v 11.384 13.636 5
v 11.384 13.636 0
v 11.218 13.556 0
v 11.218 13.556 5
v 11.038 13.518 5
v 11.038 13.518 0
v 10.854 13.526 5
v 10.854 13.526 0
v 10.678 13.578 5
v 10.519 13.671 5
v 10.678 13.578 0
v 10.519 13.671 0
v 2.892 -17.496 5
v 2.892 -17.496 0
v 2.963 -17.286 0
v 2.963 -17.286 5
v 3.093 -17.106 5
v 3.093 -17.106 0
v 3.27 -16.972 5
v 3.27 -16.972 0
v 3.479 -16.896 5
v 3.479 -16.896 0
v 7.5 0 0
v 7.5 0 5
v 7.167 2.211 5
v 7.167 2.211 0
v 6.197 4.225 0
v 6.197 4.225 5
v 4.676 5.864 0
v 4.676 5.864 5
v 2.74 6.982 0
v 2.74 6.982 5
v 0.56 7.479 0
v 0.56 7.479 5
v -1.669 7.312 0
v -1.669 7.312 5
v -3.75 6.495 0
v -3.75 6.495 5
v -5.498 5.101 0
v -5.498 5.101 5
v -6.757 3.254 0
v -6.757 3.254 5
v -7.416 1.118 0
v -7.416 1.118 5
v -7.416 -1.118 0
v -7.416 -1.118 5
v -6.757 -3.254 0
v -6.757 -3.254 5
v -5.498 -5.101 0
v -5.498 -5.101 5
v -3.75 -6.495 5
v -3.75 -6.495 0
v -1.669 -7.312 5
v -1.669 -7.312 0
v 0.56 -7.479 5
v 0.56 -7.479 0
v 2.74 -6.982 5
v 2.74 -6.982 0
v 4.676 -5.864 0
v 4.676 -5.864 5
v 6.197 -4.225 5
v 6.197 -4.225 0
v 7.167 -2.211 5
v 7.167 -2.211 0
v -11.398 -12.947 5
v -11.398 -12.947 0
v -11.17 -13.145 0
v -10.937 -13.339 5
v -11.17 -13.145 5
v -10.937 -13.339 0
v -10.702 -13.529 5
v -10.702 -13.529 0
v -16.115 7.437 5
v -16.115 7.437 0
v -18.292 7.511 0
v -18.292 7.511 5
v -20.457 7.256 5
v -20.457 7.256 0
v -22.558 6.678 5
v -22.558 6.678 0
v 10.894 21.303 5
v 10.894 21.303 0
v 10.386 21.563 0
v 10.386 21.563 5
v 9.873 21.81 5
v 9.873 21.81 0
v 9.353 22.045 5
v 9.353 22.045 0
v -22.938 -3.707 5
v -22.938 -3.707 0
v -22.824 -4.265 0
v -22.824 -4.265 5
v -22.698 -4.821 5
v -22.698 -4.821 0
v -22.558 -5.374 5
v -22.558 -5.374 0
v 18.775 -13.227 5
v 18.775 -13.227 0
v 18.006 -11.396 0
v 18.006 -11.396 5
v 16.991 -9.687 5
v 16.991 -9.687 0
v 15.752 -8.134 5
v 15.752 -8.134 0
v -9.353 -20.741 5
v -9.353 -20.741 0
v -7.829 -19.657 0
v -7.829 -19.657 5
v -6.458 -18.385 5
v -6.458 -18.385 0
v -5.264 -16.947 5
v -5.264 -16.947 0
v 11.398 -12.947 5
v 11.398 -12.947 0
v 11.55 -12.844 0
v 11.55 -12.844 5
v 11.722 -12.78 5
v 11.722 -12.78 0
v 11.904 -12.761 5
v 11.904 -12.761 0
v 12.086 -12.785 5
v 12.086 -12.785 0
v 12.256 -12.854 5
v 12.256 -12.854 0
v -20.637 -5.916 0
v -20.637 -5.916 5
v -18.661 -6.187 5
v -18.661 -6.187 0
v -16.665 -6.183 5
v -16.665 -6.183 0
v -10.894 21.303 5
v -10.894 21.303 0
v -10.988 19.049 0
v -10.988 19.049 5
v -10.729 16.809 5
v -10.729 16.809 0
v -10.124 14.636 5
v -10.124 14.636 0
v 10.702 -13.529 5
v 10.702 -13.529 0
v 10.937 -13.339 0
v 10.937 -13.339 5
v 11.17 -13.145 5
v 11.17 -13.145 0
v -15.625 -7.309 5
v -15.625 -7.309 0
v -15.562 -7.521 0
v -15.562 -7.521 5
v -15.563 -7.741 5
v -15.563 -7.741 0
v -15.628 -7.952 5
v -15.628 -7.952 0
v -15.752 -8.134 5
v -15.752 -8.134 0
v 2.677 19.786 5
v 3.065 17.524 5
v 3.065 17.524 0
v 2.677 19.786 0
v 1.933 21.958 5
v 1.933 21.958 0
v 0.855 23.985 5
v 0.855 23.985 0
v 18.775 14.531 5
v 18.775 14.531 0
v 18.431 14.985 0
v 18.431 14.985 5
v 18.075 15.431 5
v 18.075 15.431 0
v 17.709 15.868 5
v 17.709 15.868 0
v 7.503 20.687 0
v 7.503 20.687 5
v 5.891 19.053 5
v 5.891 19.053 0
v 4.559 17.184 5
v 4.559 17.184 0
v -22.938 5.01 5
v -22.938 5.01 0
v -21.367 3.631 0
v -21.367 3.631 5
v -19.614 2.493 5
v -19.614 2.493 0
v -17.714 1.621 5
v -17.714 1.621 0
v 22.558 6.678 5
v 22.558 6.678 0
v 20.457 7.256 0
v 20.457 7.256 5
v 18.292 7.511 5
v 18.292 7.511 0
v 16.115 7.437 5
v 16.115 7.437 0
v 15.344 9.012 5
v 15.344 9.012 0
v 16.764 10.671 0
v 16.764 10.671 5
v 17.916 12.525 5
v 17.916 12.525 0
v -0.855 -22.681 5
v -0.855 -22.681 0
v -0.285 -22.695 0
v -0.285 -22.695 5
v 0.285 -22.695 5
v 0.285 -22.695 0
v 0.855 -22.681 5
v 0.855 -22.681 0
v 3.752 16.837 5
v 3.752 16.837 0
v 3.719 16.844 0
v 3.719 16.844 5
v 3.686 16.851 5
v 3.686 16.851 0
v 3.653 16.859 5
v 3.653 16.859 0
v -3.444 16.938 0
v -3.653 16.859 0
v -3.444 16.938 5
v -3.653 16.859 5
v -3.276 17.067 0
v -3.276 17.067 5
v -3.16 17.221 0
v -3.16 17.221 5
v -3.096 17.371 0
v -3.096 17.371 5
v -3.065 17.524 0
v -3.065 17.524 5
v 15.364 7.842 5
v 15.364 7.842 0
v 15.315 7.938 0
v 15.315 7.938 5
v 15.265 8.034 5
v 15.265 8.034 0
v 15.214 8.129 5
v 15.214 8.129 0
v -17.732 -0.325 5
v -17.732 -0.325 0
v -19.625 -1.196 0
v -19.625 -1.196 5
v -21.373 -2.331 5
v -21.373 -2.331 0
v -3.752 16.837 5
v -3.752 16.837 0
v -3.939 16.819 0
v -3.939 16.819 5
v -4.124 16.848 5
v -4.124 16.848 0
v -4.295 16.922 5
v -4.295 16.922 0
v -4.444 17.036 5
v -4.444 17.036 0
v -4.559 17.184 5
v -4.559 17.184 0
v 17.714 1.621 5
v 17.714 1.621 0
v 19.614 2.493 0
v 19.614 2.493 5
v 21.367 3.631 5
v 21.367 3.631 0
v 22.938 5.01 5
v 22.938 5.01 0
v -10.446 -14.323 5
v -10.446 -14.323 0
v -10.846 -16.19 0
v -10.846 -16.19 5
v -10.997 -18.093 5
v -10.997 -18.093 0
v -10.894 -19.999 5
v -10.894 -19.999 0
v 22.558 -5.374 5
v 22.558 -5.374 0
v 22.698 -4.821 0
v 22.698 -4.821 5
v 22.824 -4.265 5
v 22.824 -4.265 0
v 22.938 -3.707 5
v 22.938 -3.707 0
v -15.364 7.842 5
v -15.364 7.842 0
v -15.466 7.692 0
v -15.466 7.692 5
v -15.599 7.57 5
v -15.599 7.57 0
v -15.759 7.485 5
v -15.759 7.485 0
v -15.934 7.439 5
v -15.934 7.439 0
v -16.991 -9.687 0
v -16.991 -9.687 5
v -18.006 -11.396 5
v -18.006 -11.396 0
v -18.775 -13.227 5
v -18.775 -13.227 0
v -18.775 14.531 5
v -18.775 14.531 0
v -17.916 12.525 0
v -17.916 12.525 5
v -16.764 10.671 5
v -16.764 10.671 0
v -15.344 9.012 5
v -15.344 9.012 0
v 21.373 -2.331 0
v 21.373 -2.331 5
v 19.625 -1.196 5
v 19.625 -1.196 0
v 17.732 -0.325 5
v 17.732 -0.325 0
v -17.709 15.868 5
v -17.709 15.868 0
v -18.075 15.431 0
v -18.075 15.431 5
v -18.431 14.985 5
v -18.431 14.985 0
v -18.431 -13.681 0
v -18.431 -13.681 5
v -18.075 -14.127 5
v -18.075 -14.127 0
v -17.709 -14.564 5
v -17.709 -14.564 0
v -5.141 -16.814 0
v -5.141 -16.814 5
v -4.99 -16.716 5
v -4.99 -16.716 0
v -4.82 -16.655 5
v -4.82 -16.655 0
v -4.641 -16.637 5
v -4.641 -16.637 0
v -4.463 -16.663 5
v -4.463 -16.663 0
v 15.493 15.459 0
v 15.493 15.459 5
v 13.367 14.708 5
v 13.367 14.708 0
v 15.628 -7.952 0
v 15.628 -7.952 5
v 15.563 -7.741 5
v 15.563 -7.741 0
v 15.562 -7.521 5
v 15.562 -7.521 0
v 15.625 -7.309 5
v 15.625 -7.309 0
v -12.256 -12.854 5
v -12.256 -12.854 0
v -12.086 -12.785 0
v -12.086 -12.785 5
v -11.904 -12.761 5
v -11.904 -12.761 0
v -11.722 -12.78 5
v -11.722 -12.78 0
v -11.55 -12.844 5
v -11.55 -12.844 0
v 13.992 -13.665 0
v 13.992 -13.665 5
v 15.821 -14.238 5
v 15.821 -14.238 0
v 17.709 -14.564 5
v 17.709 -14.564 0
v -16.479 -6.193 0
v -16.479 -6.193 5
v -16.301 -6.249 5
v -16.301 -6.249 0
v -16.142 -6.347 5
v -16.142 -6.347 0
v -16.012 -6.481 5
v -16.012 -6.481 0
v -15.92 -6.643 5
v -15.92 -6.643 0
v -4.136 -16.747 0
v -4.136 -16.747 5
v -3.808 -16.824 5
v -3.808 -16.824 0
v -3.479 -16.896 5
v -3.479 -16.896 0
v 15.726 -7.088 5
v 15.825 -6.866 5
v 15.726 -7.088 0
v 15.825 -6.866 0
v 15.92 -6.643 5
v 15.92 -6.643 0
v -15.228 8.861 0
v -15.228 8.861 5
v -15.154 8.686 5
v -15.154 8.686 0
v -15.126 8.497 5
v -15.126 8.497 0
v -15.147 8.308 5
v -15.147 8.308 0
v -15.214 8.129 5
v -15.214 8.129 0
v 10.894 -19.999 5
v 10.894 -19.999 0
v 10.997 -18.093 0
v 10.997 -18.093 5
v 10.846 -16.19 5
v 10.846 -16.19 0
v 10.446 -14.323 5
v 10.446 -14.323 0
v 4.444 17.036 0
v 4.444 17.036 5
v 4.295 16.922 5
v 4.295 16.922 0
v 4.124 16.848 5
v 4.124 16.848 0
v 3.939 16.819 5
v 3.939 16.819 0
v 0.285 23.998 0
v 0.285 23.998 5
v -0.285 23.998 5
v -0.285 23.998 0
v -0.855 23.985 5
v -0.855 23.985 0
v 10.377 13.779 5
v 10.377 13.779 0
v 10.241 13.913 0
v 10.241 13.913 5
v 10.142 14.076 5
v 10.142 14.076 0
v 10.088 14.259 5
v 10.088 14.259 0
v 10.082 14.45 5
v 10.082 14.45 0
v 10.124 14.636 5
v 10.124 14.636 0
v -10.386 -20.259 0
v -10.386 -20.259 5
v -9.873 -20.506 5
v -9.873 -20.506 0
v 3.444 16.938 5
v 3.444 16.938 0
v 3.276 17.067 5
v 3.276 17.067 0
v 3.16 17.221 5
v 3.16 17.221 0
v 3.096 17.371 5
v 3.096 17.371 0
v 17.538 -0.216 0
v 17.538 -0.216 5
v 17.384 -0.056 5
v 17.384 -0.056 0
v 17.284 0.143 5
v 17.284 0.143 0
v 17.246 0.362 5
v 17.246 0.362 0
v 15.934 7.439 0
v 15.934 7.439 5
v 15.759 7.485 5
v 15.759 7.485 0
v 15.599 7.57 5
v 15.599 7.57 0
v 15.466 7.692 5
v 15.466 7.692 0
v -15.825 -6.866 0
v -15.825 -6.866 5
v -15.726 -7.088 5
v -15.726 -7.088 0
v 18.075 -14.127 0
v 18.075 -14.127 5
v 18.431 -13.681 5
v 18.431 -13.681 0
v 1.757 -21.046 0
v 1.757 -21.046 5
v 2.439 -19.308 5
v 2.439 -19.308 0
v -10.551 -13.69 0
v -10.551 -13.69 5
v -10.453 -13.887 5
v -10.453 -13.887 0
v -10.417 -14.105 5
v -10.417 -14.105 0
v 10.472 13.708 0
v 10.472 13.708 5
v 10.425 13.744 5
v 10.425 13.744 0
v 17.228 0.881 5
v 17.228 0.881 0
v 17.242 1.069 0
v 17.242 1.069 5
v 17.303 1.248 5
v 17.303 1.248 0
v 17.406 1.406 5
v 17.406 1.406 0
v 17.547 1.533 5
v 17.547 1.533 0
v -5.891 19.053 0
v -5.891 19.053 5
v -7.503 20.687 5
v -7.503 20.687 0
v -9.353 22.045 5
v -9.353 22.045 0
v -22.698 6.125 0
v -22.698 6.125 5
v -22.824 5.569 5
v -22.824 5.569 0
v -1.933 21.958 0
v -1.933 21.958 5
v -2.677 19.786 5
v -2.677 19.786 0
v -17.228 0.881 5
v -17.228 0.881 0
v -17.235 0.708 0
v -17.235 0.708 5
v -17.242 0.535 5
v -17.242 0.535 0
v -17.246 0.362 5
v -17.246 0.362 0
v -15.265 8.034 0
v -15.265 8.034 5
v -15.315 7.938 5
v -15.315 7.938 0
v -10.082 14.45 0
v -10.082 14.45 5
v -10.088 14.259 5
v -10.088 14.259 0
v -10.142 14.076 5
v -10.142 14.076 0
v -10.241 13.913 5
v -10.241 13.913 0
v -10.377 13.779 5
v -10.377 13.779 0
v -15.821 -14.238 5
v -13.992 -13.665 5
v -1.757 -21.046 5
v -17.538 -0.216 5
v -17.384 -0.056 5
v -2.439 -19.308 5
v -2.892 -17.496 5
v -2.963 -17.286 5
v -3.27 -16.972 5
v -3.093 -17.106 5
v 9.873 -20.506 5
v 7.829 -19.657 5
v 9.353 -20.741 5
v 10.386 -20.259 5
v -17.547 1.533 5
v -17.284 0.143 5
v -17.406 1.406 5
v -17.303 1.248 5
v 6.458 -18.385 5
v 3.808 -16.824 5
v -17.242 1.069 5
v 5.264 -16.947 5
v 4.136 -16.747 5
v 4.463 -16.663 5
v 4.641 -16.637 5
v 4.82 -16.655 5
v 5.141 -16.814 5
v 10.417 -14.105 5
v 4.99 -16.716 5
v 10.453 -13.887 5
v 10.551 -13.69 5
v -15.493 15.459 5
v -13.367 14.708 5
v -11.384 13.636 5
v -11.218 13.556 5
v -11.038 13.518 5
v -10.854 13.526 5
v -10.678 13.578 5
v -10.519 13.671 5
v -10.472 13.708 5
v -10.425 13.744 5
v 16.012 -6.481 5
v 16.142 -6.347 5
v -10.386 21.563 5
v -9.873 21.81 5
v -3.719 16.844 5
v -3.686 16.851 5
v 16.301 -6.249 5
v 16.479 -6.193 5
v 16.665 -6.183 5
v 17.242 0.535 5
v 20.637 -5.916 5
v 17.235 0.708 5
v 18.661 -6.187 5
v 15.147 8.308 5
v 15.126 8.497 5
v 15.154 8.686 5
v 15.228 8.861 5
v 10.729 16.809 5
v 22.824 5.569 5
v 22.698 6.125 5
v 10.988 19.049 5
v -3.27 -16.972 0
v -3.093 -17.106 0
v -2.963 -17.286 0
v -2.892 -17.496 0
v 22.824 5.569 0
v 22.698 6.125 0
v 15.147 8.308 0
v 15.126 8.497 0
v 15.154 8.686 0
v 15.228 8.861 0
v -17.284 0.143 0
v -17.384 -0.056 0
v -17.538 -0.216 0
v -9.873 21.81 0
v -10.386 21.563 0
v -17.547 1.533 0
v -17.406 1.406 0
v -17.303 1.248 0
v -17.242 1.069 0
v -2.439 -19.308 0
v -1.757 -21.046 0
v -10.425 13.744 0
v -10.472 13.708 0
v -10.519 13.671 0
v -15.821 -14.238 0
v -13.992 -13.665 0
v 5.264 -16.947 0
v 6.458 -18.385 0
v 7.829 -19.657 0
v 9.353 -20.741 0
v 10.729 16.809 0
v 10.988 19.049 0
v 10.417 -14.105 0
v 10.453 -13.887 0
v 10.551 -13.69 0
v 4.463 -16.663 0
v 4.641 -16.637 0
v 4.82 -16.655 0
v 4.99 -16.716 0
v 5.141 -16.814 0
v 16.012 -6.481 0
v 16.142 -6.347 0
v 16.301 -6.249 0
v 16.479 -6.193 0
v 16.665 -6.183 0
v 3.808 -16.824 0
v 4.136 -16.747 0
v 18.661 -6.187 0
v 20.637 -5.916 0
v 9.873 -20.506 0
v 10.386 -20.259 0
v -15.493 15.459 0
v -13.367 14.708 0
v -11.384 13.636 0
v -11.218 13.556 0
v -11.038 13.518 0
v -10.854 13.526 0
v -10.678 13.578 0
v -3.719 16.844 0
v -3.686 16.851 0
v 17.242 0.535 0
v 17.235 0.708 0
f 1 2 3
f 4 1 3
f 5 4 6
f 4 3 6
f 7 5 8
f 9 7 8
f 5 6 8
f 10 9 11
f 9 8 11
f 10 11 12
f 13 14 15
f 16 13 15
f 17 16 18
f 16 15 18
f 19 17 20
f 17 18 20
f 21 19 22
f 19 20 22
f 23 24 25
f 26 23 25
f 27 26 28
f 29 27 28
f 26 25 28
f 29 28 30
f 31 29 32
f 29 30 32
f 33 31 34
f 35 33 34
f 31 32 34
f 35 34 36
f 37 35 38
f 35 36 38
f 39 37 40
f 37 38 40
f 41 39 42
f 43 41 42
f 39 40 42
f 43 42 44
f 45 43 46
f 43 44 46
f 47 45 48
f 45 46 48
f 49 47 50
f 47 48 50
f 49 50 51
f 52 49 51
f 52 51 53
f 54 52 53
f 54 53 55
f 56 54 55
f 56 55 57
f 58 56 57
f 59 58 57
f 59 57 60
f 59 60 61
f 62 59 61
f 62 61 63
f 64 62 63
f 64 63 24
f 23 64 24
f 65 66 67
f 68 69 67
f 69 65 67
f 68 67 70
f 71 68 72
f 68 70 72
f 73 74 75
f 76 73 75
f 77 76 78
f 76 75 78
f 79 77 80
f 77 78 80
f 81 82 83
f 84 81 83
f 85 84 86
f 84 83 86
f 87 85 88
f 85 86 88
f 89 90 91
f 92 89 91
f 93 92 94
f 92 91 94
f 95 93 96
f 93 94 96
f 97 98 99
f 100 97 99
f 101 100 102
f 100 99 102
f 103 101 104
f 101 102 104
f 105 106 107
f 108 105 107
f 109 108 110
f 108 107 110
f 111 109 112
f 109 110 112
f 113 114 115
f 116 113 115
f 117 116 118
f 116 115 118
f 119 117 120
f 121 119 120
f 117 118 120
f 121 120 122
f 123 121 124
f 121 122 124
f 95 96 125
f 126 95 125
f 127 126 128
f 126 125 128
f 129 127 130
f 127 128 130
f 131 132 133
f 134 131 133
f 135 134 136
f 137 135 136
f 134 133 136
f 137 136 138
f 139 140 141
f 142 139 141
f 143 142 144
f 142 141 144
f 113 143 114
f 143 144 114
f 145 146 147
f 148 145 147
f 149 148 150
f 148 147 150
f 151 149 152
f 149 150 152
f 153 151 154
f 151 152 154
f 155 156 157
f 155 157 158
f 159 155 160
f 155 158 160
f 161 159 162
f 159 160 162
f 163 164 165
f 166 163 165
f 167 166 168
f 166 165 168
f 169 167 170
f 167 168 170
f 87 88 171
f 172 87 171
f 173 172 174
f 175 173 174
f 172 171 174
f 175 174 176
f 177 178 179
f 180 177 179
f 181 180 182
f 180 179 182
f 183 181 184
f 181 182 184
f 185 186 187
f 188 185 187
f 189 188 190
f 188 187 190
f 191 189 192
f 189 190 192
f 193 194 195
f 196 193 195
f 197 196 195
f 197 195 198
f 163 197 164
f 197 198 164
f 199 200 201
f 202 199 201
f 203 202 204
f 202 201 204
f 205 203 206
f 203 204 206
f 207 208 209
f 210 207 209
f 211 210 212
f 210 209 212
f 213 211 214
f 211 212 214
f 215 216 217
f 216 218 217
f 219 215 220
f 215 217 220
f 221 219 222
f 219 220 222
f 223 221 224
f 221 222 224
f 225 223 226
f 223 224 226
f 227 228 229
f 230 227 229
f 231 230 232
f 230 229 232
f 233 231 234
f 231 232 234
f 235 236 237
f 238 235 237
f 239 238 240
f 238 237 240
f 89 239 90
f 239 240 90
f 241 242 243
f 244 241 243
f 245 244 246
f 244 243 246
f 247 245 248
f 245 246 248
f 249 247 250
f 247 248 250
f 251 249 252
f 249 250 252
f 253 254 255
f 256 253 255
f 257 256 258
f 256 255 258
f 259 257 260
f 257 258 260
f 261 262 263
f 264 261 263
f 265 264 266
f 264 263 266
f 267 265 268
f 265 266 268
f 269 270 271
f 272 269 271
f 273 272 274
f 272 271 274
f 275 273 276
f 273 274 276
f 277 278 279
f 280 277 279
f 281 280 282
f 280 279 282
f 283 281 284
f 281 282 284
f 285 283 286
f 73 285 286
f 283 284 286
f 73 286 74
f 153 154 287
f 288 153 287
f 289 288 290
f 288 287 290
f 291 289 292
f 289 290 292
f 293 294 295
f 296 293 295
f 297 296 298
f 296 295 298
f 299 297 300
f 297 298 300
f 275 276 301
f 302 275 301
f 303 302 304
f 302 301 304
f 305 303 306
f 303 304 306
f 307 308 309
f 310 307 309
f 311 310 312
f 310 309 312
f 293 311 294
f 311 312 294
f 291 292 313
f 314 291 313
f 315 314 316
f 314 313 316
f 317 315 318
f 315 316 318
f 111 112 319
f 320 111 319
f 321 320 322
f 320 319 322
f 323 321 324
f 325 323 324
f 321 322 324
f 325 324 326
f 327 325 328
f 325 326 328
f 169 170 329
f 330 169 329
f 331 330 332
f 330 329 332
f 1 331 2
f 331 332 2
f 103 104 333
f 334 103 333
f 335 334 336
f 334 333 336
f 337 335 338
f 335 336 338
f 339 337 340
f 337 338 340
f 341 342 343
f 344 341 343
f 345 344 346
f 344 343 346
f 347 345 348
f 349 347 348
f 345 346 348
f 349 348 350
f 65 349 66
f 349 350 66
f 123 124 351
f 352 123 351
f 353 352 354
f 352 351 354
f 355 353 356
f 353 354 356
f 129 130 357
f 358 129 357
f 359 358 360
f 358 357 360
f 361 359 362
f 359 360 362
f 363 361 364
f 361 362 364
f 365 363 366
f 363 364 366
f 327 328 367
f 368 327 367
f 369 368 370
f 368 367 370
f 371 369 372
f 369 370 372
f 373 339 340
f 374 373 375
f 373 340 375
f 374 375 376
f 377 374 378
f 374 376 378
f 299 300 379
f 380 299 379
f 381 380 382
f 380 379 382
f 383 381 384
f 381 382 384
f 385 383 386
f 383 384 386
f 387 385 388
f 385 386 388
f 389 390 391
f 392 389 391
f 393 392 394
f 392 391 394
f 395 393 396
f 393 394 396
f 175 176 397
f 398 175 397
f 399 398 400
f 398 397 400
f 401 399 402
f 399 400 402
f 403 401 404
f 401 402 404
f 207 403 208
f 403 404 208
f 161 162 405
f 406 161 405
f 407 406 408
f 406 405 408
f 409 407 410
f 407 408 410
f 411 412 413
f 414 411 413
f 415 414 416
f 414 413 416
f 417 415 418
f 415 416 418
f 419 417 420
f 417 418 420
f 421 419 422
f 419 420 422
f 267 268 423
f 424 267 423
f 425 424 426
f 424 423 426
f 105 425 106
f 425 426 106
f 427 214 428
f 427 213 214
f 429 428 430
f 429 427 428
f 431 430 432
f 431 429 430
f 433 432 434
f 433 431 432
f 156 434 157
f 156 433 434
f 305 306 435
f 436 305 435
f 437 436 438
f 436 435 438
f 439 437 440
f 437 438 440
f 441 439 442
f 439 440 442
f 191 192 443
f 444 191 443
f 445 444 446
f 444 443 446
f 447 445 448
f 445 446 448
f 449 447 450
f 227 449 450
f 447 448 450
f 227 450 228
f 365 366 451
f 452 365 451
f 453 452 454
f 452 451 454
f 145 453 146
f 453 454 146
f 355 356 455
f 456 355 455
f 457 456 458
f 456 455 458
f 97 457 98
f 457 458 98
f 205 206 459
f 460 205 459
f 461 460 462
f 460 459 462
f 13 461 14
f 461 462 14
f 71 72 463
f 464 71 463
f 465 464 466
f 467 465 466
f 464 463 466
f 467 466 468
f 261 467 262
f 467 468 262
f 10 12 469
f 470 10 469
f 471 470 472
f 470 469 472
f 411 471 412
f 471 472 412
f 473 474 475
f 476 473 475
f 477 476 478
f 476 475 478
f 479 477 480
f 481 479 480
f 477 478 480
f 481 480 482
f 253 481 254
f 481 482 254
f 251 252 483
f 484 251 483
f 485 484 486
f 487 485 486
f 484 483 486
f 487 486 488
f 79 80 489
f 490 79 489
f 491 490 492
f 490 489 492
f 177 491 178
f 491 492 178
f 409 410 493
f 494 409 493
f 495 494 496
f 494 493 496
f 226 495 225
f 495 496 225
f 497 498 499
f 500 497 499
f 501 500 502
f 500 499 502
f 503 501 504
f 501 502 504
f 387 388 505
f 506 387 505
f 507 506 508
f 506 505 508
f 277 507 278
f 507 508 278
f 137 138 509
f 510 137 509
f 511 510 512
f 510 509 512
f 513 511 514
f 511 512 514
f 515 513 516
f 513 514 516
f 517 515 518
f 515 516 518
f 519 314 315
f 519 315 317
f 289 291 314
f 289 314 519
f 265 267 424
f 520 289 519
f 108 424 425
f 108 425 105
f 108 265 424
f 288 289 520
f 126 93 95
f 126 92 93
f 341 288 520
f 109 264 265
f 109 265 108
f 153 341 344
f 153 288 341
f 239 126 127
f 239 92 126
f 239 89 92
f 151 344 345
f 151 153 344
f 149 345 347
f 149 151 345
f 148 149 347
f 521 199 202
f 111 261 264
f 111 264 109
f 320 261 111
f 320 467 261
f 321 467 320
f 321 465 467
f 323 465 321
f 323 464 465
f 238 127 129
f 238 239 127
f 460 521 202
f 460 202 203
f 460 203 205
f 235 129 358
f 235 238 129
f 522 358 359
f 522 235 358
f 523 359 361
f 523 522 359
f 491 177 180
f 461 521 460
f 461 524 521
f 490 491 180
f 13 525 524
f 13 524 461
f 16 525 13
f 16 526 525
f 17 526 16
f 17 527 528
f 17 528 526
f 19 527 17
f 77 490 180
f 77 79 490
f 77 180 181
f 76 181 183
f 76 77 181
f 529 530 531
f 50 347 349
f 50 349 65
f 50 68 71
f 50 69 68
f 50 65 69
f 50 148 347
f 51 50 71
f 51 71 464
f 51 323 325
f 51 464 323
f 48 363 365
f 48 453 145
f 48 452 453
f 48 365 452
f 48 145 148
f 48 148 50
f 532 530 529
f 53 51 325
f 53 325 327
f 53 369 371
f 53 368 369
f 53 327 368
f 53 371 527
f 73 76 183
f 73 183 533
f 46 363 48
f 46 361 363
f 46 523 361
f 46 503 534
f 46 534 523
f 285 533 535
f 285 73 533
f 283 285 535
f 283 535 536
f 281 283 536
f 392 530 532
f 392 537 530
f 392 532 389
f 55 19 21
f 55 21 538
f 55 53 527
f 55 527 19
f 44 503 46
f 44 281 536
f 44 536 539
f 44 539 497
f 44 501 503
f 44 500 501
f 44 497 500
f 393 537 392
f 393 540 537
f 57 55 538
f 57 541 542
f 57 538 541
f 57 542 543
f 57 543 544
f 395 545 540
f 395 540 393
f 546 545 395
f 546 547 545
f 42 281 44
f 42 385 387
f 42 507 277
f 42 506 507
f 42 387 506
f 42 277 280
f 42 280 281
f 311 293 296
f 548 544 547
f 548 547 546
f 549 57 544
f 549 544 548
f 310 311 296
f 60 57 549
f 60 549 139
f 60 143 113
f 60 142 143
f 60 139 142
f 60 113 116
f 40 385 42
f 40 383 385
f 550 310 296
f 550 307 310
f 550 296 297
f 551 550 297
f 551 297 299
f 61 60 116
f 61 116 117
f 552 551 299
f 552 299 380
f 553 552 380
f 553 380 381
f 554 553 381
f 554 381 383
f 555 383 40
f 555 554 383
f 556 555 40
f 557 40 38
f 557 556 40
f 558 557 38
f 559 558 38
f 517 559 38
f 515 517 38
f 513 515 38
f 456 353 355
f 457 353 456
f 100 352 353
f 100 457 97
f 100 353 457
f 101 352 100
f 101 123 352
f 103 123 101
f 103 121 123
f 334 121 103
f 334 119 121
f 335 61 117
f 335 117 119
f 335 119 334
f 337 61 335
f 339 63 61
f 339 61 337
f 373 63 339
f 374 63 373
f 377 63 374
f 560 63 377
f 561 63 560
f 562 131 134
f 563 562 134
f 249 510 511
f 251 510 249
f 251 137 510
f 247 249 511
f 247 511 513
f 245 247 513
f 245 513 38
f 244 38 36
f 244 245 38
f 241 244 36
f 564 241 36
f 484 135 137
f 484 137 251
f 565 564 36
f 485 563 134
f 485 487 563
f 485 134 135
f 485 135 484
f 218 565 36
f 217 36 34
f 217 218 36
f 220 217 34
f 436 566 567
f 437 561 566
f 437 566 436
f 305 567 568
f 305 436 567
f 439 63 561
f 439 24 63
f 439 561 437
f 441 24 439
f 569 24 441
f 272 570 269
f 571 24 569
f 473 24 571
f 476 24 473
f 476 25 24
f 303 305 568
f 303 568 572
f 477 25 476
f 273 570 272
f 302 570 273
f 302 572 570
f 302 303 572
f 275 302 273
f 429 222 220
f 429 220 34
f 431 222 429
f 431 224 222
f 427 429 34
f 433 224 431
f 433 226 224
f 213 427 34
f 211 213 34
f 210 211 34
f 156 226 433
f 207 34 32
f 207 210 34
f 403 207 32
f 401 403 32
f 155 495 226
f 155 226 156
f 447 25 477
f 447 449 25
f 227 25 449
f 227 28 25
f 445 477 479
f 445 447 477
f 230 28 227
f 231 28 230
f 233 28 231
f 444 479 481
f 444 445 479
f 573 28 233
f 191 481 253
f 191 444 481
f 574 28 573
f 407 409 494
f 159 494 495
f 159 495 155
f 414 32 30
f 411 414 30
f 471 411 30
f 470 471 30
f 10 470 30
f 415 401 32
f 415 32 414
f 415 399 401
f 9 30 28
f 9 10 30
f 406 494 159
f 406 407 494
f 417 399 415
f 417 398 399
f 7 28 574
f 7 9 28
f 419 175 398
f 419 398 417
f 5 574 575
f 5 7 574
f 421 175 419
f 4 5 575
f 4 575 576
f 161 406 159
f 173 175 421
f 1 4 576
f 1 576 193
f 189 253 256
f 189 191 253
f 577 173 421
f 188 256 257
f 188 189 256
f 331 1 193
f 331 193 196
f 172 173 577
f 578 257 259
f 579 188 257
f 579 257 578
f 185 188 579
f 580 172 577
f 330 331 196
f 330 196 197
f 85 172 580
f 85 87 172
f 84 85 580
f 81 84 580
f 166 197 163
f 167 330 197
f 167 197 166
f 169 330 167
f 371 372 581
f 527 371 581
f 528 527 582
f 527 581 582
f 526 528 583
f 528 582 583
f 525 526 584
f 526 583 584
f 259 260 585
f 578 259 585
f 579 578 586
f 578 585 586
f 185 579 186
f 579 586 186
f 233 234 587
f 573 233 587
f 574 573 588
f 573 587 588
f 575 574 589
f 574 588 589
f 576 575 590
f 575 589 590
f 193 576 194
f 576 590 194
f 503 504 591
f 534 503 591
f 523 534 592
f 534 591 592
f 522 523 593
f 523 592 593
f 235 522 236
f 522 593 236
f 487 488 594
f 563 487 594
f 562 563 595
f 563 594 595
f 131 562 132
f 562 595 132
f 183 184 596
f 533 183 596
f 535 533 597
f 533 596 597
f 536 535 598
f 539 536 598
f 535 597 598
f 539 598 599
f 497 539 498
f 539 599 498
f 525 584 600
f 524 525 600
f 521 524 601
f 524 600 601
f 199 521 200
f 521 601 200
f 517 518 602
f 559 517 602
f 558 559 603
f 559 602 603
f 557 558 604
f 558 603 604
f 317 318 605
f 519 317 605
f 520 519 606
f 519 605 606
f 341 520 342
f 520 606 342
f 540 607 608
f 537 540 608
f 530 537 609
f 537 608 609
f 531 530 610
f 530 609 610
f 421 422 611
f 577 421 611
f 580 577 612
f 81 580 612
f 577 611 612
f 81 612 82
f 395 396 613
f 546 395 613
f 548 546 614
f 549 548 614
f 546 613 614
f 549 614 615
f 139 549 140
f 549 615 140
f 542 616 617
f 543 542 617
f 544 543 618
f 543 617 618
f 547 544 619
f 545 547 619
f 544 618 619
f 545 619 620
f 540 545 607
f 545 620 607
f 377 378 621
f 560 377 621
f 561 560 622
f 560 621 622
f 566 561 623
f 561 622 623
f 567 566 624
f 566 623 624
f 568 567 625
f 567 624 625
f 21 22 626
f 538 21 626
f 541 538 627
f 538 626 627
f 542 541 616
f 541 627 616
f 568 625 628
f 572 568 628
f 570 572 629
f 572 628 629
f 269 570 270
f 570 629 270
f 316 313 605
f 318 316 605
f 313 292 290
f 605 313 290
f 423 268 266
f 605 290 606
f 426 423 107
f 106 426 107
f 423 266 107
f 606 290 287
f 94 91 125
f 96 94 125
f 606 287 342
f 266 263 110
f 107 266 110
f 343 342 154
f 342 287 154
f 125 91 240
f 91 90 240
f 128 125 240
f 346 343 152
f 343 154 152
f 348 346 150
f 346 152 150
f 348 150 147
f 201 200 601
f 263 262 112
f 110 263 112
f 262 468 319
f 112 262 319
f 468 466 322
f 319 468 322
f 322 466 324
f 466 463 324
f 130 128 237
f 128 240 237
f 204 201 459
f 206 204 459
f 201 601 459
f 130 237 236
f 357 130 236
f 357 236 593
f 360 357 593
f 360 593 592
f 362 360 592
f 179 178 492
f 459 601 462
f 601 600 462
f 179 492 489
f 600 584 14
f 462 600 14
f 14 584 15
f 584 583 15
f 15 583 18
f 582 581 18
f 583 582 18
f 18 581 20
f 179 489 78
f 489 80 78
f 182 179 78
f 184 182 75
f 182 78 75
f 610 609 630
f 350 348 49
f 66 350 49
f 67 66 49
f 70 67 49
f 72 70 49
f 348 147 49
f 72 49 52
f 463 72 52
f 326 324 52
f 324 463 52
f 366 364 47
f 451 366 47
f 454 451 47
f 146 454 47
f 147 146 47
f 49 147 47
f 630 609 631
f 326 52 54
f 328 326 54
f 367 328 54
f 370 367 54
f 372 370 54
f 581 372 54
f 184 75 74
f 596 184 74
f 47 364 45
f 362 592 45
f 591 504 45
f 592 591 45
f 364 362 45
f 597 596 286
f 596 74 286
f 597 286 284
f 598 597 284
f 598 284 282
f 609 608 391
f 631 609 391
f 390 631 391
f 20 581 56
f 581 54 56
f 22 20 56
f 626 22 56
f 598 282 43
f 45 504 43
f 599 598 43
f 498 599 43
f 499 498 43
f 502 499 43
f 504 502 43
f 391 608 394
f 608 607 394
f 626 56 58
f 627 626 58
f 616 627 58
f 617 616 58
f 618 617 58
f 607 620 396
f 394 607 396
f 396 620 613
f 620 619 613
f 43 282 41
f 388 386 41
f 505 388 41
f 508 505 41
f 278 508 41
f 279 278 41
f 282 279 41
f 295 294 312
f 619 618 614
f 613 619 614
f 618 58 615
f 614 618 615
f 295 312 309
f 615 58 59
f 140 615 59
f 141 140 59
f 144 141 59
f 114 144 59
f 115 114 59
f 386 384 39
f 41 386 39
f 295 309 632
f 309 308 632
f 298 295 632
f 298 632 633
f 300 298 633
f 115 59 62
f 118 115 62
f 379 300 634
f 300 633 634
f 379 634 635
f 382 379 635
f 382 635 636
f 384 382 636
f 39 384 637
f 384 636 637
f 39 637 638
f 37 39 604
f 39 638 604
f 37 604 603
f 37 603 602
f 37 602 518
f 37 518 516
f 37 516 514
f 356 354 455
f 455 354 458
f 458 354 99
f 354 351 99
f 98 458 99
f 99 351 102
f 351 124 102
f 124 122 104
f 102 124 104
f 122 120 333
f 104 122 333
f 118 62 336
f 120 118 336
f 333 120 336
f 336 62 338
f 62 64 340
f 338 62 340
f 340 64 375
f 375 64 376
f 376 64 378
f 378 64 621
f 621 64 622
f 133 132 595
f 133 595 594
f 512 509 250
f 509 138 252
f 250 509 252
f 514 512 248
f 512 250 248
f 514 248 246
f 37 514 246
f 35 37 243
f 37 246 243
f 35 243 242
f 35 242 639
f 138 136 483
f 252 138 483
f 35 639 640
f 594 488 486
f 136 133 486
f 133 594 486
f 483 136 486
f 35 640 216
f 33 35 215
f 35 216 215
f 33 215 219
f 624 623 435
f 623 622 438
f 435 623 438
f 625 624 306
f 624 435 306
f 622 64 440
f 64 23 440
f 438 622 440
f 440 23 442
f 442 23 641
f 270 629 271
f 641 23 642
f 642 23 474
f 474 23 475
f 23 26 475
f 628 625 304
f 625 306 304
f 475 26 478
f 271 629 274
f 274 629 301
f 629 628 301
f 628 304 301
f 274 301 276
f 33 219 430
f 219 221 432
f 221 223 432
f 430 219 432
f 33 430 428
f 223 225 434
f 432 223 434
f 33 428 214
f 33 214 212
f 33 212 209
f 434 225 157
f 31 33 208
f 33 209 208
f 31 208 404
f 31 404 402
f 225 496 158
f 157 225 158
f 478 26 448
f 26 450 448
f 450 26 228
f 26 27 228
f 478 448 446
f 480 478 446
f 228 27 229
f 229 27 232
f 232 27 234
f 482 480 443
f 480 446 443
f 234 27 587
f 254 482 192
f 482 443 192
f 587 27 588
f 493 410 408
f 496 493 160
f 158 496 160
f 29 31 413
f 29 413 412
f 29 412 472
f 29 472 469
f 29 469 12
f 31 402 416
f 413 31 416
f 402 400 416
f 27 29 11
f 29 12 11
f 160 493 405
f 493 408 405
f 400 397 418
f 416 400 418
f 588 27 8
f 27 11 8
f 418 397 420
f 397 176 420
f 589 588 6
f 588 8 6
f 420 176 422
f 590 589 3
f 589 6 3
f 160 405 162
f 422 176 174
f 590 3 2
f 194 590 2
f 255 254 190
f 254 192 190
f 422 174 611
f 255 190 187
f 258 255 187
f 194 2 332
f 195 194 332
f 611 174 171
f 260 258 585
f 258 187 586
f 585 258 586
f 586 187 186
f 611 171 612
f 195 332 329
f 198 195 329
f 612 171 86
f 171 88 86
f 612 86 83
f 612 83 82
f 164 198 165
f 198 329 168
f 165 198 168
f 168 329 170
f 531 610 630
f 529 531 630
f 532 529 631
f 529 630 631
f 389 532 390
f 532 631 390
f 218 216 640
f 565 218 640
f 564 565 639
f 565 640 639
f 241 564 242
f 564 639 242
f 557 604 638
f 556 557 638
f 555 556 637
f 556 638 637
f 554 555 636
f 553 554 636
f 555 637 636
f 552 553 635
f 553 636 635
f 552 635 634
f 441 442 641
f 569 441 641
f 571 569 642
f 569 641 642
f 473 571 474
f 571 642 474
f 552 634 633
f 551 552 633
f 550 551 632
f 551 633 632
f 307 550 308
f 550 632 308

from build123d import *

# Parameters (mm, degrees)
SKETCH_1_R               = 17.25
EXTRUDE_1_DEPTH          = 5
EXTRUDE_2_DEPTH          = 5
FILLET_1_R               = 0.75
PATTERN_CIRCULAR_1_DEPTH = 5
CUT_EXTRUDE_2_REACH      = 35.573
SKETCH_2_R               = 7.5


# Read off the part's stored shape, not the designer's step: 원형 패턴1
with BuildPart() as part:
    # 스케치1 → 보스-돌출1 (new body)
    with BuildSketch(Plane.XY):
        Circle(SKETCH_1_R)
    extrude(amount=EXTRUDE_1_DEPTH)

    # 스케치1<3> → 보스-돌출2 (add)
    with BuildSketch(Plane.XY):
        with BuildLine():
            ThreePointArc((3.105, 16.968249026), (2.435929865, 20.62271117), (0.855, 23.984765477))
            ThreePointArc((0.855, 23.984765477), (0, 24), (-0.855, 23.984765477))
            ThreePointArc((-0.855, 23.984765477), (-2.435929865, 20.62271117), (-3.105, 16.968249026))
            ThreePointArc((-3.105, 16.968249026), (0, 17.25), (3.105, 16.968249026))
        make_face()
    extrude(amount=EXTRUDE_2_DEPTH)

    # 필렛1
    fillet_1_edges = [part.edges().sort_by_distance(p)[0] for p in [
        (-3.105, 16.968249026, 2.5),
        (3.105, 16.968249026, 2.5),
    ]]
    fillet(fillet_1_edges, radius=FILLET_1_R)

    # 원형 패턴1 outline → 원형 패턴1 (add)
    with BuildSketch(Plane.XY):
        with BuildLine():
            ThreePointArc((3.752409392, 16.836921446), (7.228370534, 15.662476159), (10.37732262, 13.77946571))
            ThreePointArc((10.37732262, 13.77946571), (10.109330299, 14.165782518), (10.123973341, 14.635725219))
            ThreePointArc((10.123973341, 14.635725219), (10.902507886, 17.923971687), (10.894078225, 21.303115042))
            ThreePointArc((10.894078225, 21.303115042), (10.130359855, 21.68781147), (9.353421461, 22.045056236))
            ThreePointArc((9.353421461, 22.045056236), (6.66426095, 19.902390957), (4.559090047, 17.183778404))
            ThreePointArc((4.559090047, 17.183778404), (4.211817106, 16.879954744), (3.752409392, 16.836921446))
        make_face()
        with BuildLine():
            ThreePointArc((10.519299619, 13.671387476), (13.161797978, 11.150317215), (15.214303094, 8.129420728))
            ThreePointArc((15.214303094, 8.129420728), (15.133819906, 8.592297997), (15.344497995, 9.012235673))
            ThreePointArc((15.344497995, 9.012235673), (17.375059394, 11.575860868), (18.775450651, 14.531238688))
            ThreePointArc((18.775450651, 14.531238688), (18.2542777, 15.209203175), (17.70928309, 15.868170523))
            ThreePointArc((17.70928309, 15.868170523), (14.414969994, 15.125158945), (11.38395589, 13.636025477))
            ThreePointArc((11.38395589, 13.636025477), (10.94601321, 13.516422059), (10.519299619, 13.671387476))
        make_face()
        with BuildLine():
            ThreePointArc((15.364476978, 7.841896914), (16.663551392, 4.459658622), (17.227504247, 0.880680084))
            ThreePointArc((17.227504247, 0.880680084), (17.349588602, 1.330612703), (17.713914892, 1.62149121))
            ThreePointArc((17.713914892, 1.62149121), (20.511209748, 3.030450816), (22.938114809, 5.010389578))
            ThreePointArc((22.938114809, 5.010389578), (22.762711972, 5.847342943), (22.557604012, 6.677516308))
            ThreePointArc((22.557604012, 6.677516308), (19.379376386, 7.424645609), (16.1145377, 7.437349496))
            ThreePointArc((16.1145377, 7.437349496), (15.676466798, 7.522741397), (15.364476978, 7.841896914))
        make_face()
        with BuildLine():
            ThreePointArc((17.246205523, 0.361794236), (16.948744989, -3.209757512), (15.919681663, -6.642758143))
            ThreePointArc((15.919681663, -6.642758143), (16.218467781, -6.293015235), (16.665227716, -6.183476169))
            ThreePointArc((16.665227716, -6.183476169), (19.653637621, -6.085826774), (22.557604012, -5.373711355))
            ThreePointArc((22.557604012, -5.373711355), (22.762711972, -4.543537991), (22.938114809, -3.706584626))
            ThreePointArc((22.938114809, -3.706584626), (20.519516774, -1.732038623), (17.732464097, -0.324634719))
            ThreePointArc((17.732464097, -0.324634719), (17.384038193, -0.056011184), (17.246205523, 0.361794236))
        make_face()
        with BuildLine():
            ThreePointArc((15.624899975, -7.30924078), (13.802641251, -10.346477396), (11.398453982, -12.947499636))
            ThreePointArc((11.398453982, -12.947499636), (11.812346904, -12.764896736), (12.255961374, -12.853538558))
            ThreePointArc((12.255961374, -12.853538558), (14.896975546, -13.981953909), (17.70928309, -14.56436557))
            ThreePointArc((17.70928309, -14.56436557), (18.2542777, -13.905398222), (18.775450651, -13.227433735))
            ThreePointArc((18.775450651, -13.227433735), (17.528042353, -10.523846266), (15.751756091, -8.13423965))
            ThreePointArc((15.751756091, -8.13423965), (15.562955662, -7.741018123), (15.624899975, -7.30924078))
        make_face()
        with BuildLine():
            ThreePointArc((10.701599161, -13.529163884), (7.742304938, -15.414902343), (4.462626447, -16.662756831))
            ThreePointArc((4.462626447, -16.662756831), (4.907143939, -16.680291261), (5.263531943, -16.946544614))
            ThreePointArc((5.263531943, -16.946544614), (7.123124119, -19.043668749), (9.353421461, -20.741251283))
            ThreePointArc((9.353421461, -20.741251283), (10.130359855, -20.384006517), (10.894078225, -19.99931009))
            ThreePointArc((10.894078225, -19.99931009), (10.952928458, -17.13877644), (10.445613014, -14.322973331))
            ThreePointArc((10.445613014, -14.322973331), (10.45308323, -13.887202628), (10.701599161, -13.529163884))
        make_face()
        with BuildLine():
            ThreePointArc((3.478512175, -16.895634142), (0, -17.25), (-3.478512175, -16.895634142))
            ThreePointArc((-3.478512175, -16.895634142), (-3.093309657, -17.106080205), (-2.891850292, -17.496057961))
            ThreePointArc((-2.891850292, -17.496057961), (-2.126287606, -20.187844374), (-0.855, -22.680960525))
            ThreePointArc((-0.855, -22.680960525), (0, -22.696195047), (0.855, -22.680960525))
            ThreePointArc((0.855, -22.680960525), (2.126287606, -20.187844374), (2.891850292, -17.496057961))
            ThreePointArc((2.891850292, -17.496057961), (3.093309657, -17.106080205), (3.478512175, -16.895634142))
        make_face()
        with BuildLine():
            ThreePointArc((-4.462626447, -16.662756831), (-7.742304938, -15.414902343), (-10.701599161, -13.529163884))
            ThreePointArc((-10.701599161, -13.529163884), (-10.45308323, -13.887202628), (-10.445613014, -14.322973331))
            ThreePointArc((-10.445613014, -14.322973331), (-10.952928458, -17.13877644), (-10.894078225, -19.99931009))
            ThreePointArc((-10.894078225, -19.99931009), (-10.130359855, -20.384006517), (-9.353421461, -20.741251283))
            ThreePointArc((-9.353421461, -20.741251283), (-7.123124119, -19.043668749), (-5.263531943, -16.946544614))
            ThreePointArc((-5.263531943, -16.946544614), (-4.907143939, -16.680291261), (-4.462626447, -16.662756831))
        make_face()
        with BuildLine():
            ThreePointArc((-11.398453982, -12.947499636), (-13.802641251, -10.346477396), (-15.624899975, -7.30924078))
            ThreePointArc((-15.624899975, -7.30924078), (-15.562955662, -7.741018123), (-15.751756091, -8.13423965))
            ThreePointArc((-15.751756091, -8.13423965), (-17.528042353, -10.523846266), (-18.775450651, -13.227433735))
            ThreePointArc((-18.775450651, -13.227433735), (-18.2542777, -13.905398222), (-17.70928309, -14.56436557))
            ThreePointArc((-17.70928309, -14.56436557), (-14.896975546, -13.981953909), (-12.255961374, -12.853538558))
            ThreePointArc((-12.255961374, -12.853538558), (-11.812346904, -12.764896736), (-11.398453982, -12.947499636))
        make_face()
        with BuildLine():
            ThreePointArc((-15.919681663, -6.642758143), (-16.948744989, -3.209757512), (-17.246205523, 0.361794236))
            ThreePointArc((-17.246205523, 0.361794236), (-17.384038193, -0.056011184), (-17.732464097, -0.324634719))
            ThreePointArc((-17.732464097, -0.324634719), (-20.519516774, -1.732038623), (-22.938114809, -3.706584626))
            ThreePointArc((-22.938114809, -3.706584626), (-22.762711972, -4.543537991), (-22.557604012, -5.373711355))
            ThreePointArc((-22.557604012, -5.373711355), (-19.653637621, -6.085826774), (-16.665227716, -6.183476169))
            ThreePointArc((-16.665227716, -6.183476169), (-16.218467781, -6.293015235), (-15.919681663, -6.642758143))
        make_face()
        with BuildLine():
            ThreePointArc((-17.227504247, 0.880680084), (-16.663551392, 4.459658622), (-15.364476978, 7.841896914))
            ThreePointArc((-15.364476978, 7.841896914), (-15.676466798, 7.522741397), (-16.1145377, 7.437349496))
            ThreePointArc((-16.1145377, 7.437349496), (-19.379376386, 7.424645609), (-22.557604012, 6.677516308))
            ThreePointArc((-22.557604012, 6.677516308), (-22.762711972, 5.847342943), (-22.938114809, 5.010389578))
            ThreePointArc((-22.938114809, 5.010389578), (-20.511209748, 3.030450816), (-17.713914892, 1.62149121))
            ThreePointArc((-17.713914892, 1.62149121), (-17.349588602, 1.330612703), (-17.227504247, 0.880680084))
        make_face()
        with BuildLine():
            ThreePointArc((-15.214303094, 8.129420728), (-13.161797978, 11.150317215), (-10.519299619, 13.671387476))
            ThreePointArc((-10.519299619, 13.671387476), (-10.94601321, 13.516422059), (-11.38395589, 13.636025477))
            ThreePointArc((-11.38395589, 13.636025477), (-14.414969994, 15.125158945), (-17.70928309, 15.868170523))
            ThreePointArc((-17.70928309, 15.868170523), (-18.2542777, 15.209203175), (-18.775450651, 14.531238688))
            ThreePointArc((-18.775450651, 14.531238688), (-17.375059394, 11.575860868), (-15.344497995, 9.012235673))
            ThreePointArc((-15.344497995, 9.012235673), (-15.133819906, 8.592297997), (-15.214303094, 8.129420728))
        make_face()
        with BuildLine():
            ThreePointArc((-4.559090047, 17.183778404), (-6.66426095, 19.902390957), (-9.353421461, 22.045056236))
            ThreePointArc((-9.353421461, 22.045056236), (-10.130359855, 21.68781147), (-10.894078225, 21.303115042))
            ThreePointArc((-10.894078225, 21.303115042), (-10.902507886, 17.923971687), (-10.123973341, 14.635725219))
            ThreePointArc((-10.123973341, 14.635725219), (-10.109330299, 14.165782518), (-10.37732262, 13.77946571))
            ThreePointArc((-10.37732262, 13.77946571), (-7.228370534, 15.662476159), (-3.752409392, 16.836921446))
            ThreePointArc((-3.752409392, 16.836921446), (-4.211817106, 16.879954744), (-4.559090047, 17.183778404))
        make_face()
    extrude(amount=PATTERN_CIRCULAR_1_DEPTH)

    # 스케치2 → 컷-돌출2 (cut, up to next)
    with BuildSketch(Plane.XY.offset(5), mode=Mode.PRIVATE) as cut_extrude_2_sk1:
        Circle(SKETCH_2_R)
    cut_extrude_2_tool1 = extrude(cut_extrude_2_sk1.sketch, amount=-CUT_EXTRUDE_2_REACH, mode=Mode.PRIVATE) & part.part
    add(cut_extrude_2_tool1.solids().sort_by_distance((0, 0, 5))[0], mode=Mode.SUBTRACT)


solid = part.part
